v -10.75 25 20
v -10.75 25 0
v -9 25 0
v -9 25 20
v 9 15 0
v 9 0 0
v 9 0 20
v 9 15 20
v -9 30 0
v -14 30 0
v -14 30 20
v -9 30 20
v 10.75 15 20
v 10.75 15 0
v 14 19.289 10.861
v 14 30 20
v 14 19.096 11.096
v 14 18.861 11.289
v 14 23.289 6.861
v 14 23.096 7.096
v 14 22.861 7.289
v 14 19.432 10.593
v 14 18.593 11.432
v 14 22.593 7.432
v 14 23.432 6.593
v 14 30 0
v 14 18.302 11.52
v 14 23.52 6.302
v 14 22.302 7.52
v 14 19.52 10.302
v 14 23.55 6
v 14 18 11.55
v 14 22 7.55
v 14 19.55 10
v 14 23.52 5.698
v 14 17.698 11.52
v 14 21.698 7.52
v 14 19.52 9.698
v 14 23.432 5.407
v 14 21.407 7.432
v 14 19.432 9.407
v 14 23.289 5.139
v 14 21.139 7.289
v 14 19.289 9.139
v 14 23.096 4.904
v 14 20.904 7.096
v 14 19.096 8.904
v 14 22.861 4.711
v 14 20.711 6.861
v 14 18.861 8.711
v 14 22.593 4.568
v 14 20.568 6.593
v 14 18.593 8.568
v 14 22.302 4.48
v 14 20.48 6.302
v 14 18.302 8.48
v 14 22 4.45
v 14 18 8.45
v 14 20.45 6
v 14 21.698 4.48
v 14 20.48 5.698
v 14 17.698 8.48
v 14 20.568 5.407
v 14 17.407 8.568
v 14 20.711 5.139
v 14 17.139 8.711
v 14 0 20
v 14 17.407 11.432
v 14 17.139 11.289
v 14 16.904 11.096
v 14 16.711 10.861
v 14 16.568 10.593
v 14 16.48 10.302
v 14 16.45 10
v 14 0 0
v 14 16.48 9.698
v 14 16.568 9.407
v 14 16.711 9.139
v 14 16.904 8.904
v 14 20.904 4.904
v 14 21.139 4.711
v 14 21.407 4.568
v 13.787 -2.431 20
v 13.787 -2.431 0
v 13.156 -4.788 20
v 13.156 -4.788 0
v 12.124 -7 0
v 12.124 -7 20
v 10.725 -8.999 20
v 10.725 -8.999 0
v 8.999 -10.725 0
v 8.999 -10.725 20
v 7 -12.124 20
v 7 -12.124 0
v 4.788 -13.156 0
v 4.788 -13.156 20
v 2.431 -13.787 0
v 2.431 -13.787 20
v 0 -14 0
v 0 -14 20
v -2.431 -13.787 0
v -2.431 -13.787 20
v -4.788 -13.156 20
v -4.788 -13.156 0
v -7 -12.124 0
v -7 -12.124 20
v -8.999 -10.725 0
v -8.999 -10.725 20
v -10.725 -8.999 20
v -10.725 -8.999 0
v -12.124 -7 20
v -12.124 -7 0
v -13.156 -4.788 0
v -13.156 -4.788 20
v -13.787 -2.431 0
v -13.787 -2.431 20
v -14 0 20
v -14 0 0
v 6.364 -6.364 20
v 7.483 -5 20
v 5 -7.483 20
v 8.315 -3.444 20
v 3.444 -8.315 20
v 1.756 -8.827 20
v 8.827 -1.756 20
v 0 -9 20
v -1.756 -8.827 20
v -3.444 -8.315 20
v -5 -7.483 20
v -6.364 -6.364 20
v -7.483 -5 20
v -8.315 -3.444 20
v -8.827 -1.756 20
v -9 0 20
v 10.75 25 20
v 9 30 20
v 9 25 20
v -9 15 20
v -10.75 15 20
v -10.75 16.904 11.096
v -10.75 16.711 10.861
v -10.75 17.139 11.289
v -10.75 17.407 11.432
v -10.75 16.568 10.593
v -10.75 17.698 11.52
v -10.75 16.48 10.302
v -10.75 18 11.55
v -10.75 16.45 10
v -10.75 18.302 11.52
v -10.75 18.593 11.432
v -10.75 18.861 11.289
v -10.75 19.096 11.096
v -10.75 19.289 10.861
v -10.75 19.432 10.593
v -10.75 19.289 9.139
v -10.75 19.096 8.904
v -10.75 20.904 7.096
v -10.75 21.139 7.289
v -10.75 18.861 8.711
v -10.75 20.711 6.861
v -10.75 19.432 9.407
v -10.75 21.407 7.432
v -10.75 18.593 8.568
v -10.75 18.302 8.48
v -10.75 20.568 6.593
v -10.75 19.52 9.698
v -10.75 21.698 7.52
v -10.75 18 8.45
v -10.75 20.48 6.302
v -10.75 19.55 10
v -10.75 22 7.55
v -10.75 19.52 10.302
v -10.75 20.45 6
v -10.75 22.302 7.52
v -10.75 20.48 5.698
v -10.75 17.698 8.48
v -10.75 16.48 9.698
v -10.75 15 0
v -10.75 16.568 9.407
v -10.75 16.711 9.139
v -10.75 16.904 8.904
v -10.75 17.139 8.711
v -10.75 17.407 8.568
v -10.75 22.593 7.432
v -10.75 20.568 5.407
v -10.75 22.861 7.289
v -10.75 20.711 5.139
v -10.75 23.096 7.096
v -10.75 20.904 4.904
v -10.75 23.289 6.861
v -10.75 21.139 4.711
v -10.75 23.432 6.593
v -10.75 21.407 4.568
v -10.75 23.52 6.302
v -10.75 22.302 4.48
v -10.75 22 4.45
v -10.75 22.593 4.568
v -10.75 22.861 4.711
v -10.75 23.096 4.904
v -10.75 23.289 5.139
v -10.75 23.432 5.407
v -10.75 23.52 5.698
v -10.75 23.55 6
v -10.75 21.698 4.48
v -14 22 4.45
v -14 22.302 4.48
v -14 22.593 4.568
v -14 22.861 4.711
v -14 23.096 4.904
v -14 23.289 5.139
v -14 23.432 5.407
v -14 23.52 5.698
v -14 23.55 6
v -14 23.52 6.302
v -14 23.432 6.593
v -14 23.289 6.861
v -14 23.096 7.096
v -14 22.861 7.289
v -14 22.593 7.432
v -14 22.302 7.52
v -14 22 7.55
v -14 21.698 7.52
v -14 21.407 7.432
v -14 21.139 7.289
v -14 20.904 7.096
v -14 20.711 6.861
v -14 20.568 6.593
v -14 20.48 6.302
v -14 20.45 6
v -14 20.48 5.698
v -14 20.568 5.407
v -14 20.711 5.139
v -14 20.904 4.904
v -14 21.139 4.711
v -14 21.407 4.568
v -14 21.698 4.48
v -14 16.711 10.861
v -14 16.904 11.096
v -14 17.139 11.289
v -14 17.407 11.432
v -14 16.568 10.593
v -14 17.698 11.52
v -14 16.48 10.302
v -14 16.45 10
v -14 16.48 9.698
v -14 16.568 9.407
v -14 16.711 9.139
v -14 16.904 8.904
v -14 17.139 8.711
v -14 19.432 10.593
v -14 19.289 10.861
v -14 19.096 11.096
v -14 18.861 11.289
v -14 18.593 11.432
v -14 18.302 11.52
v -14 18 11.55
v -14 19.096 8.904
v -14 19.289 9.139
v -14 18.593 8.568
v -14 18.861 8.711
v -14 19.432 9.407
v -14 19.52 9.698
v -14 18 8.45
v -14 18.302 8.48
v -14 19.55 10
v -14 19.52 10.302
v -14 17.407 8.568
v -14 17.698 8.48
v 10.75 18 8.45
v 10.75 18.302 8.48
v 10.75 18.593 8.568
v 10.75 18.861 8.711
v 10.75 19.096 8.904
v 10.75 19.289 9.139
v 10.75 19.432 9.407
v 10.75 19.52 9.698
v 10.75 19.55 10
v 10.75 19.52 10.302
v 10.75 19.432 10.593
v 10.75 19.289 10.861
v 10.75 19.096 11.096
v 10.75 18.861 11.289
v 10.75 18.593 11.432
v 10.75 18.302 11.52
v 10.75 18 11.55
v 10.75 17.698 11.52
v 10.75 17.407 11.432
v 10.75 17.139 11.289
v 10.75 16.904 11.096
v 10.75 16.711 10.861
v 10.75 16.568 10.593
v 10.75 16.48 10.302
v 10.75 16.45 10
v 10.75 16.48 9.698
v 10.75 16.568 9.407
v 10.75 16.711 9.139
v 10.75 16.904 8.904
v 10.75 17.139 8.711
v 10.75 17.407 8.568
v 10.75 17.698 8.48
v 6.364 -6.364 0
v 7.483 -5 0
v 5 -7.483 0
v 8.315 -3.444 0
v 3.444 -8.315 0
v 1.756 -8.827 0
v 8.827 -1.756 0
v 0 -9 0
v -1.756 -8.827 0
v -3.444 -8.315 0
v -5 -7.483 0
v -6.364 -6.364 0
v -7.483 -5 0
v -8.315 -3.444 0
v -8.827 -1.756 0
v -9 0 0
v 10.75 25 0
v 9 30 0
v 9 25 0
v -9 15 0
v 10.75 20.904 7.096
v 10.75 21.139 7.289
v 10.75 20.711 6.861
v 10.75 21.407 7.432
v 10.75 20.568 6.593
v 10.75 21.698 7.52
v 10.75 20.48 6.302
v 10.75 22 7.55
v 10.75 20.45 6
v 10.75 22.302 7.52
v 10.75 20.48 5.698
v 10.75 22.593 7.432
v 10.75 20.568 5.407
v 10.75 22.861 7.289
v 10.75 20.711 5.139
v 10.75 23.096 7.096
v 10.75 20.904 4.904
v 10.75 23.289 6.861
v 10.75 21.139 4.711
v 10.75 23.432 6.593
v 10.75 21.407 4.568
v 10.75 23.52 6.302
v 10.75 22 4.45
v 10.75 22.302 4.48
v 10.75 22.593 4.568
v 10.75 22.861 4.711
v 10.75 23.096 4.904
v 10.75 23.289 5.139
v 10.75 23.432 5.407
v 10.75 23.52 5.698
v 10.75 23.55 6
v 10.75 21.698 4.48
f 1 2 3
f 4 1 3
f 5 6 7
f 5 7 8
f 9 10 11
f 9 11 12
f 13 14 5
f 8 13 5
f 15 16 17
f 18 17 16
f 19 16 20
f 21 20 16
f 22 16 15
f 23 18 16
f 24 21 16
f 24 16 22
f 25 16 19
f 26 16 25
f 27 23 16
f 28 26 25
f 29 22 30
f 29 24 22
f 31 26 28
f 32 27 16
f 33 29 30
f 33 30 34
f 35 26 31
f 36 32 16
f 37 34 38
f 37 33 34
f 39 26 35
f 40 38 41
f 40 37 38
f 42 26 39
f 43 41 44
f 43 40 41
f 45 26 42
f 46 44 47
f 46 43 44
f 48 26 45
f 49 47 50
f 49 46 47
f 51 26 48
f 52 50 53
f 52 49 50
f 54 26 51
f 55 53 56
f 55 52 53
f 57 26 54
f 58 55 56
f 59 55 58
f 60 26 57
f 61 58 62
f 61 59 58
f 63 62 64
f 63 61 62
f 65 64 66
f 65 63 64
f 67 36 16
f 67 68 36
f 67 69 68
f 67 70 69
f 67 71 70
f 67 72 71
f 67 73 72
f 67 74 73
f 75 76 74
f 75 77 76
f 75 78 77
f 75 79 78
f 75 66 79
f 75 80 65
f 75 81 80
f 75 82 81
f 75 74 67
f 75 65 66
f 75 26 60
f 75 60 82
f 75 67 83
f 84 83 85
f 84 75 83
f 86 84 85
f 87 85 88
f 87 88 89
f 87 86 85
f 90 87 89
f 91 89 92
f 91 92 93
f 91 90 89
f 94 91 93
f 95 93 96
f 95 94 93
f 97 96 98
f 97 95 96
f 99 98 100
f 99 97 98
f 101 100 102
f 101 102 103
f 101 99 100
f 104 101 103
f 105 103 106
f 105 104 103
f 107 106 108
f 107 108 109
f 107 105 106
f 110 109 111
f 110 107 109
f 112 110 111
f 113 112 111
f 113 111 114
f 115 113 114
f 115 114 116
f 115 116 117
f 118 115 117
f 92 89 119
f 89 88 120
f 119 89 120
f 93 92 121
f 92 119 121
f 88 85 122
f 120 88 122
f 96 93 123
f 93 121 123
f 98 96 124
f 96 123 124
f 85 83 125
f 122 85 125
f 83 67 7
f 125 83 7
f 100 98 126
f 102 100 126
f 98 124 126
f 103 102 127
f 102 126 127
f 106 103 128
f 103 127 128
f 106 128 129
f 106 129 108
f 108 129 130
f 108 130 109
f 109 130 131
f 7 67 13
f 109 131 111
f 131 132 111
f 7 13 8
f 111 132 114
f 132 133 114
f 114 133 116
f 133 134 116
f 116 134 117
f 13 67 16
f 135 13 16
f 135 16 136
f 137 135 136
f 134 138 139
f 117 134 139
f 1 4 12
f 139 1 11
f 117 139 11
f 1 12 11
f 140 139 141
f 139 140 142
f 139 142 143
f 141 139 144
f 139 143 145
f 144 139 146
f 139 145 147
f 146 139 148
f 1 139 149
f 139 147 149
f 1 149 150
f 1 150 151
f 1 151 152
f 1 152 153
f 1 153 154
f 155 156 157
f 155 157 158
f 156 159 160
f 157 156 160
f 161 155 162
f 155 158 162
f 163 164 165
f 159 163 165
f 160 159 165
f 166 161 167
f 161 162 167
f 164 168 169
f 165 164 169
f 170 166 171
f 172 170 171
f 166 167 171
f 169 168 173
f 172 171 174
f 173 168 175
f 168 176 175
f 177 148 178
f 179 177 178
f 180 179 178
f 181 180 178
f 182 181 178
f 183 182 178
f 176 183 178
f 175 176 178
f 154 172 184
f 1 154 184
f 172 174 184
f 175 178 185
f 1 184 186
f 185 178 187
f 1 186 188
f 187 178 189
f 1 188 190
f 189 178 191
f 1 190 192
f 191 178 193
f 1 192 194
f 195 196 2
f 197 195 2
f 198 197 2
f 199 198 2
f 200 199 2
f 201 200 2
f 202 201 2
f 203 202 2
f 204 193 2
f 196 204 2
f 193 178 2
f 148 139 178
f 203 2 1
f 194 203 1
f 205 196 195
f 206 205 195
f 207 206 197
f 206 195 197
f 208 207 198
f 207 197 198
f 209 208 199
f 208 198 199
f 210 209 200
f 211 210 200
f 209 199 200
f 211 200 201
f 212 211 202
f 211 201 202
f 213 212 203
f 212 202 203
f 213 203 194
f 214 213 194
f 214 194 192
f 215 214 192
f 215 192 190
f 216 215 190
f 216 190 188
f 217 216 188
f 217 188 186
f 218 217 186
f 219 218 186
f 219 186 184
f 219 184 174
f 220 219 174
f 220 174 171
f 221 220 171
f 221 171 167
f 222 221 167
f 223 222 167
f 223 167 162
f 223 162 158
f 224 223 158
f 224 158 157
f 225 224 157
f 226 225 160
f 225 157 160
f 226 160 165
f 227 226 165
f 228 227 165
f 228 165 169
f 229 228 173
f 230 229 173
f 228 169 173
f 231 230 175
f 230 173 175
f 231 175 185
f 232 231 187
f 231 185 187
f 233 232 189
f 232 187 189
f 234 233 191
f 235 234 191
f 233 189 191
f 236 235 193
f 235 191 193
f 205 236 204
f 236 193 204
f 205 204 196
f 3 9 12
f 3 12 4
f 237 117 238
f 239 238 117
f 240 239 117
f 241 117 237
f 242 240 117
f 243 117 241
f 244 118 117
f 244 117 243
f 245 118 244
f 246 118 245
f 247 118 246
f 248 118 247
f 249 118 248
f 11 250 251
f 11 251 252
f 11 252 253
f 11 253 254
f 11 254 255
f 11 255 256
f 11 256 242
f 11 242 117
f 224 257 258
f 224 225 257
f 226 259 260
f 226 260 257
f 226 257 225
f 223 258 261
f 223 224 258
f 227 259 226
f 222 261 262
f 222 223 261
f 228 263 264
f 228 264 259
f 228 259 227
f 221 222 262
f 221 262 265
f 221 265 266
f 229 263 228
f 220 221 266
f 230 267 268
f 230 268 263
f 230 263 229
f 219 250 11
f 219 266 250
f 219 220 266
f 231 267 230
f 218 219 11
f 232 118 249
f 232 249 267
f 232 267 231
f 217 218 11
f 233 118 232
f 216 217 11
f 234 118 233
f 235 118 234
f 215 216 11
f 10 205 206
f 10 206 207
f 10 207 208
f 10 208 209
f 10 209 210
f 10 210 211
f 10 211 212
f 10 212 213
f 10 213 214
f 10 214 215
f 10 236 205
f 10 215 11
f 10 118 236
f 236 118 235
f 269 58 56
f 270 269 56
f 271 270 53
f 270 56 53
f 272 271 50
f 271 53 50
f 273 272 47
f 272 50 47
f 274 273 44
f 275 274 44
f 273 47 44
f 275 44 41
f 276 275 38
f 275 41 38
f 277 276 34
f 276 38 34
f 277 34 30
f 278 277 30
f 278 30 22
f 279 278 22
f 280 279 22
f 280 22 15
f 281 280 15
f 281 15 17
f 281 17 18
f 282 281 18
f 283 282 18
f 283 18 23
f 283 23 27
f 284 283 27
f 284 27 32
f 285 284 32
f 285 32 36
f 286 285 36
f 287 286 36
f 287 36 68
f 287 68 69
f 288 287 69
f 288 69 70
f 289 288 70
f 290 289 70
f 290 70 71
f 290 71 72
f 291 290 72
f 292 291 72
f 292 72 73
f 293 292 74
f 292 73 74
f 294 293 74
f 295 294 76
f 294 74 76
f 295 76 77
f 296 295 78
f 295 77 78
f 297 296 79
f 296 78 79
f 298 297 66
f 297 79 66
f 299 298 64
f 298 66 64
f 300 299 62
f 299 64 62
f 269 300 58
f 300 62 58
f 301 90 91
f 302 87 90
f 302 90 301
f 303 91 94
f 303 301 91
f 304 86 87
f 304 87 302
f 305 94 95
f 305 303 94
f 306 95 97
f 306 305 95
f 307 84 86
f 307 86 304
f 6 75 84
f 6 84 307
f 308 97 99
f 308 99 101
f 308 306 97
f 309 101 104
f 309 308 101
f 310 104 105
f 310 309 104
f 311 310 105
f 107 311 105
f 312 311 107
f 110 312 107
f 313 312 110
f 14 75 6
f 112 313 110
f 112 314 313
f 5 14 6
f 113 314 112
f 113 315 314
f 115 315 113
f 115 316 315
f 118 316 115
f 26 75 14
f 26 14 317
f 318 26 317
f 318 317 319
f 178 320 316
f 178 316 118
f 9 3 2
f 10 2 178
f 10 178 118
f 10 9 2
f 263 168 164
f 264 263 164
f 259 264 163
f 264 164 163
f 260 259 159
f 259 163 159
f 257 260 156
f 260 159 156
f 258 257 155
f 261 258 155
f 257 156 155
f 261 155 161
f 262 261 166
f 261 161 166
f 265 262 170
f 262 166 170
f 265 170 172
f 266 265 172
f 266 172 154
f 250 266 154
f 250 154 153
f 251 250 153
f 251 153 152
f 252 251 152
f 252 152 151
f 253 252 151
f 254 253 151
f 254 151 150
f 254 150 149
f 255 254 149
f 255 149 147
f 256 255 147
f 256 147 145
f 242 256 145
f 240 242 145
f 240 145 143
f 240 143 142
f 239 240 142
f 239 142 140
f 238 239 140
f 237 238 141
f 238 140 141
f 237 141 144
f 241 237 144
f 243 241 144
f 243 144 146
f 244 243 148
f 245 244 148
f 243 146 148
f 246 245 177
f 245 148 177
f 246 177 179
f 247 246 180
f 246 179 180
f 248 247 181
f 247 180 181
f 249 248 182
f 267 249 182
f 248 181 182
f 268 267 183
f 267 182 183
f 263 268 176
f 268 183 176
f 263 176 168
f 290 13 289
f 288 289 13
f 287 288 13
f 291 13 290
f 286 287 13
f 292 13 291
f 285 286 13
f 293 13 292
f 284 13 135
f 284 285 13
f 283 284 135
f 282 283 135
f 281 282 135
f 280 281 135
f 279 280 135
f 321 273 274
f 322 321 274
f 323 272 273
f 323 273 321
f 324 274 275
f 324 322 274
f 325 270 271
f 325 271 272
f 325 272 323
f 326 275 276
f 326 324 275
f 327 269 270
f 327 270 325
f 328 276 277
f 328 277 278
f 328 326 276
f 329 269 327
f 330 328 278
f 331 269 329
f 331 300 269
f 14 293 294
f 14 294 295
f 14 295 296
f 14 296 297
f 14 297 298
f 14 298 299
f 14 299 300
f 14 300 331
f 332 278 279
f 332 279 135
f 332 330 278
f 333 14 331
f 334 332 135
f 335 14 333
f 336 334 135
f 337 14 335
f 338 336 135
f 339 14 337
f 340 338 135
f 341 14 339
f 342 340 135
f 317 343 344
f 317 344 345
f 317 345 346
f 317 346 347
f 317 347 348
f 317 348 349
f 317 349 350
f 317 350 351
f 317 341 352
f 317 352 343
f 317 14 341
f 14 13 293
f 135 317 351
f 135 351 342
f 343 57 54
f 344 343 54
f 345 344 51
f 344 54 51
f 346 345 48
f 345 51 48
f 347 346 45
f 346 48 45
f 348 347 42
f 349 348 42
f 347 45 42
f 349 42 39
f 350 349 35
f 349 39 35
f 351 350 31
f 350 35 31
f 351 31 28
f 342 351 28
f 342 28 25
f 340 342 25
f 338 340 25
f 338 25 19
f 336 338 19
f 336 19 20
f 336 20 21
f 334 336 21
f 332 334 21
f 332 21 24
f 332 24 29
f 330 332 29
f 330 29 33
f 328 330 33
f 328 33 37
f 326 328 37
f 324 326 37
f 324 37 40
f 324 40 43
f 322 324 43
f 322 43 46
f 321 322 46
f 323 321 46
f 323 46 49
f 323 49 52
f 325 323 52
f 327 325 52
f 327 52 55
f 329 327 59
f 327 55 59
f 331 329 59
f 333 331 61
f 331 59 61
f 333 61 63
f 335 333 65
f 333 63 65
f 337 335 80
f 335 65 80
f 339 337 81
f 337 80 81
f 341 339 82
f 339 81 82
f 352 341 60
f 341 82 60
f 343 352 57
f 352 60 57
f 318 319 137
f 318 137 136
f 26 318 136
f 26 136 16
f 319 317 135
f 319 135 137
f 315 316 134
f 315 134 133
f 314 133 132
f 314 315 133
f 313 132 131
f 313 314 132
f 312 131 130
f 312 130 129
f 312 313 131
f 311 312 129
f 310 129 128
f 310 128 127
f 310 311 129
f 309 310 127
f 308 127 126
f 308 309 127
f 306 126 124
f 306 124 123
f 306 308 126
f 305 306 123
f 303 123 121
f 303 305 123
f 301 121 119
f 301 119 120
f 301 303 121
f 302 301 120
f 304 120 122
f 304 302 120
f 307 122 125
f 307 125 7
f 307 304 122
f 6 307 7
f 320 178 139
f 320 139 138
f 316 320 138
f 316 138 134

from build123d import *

# Parameters (mm, degrees)
EXTRUDE_1_DEPTH     = 20
SKETCH_2_R          = 1.55
CUT_EXTRUDE_1_DEPTH = 30
SKETCH_3_W          = 1.75
SKETCH_3_H          = 10
CUT_EXTRUDE_2_DEPTH = 20


with BuildPart() as part:
    # 草图1 → 凸台-拉伸1 (new body)
    with BuildSketch(Plane.XY):
        with BuildLine():
            Line((-14, 0), (-14, 30))
            Line((-14, 30), (-9, 30))
            Line((-9, 30), (-9, 0))
            ThreePointArc((-9, 0), (0, -9), (9, 0))
            Line((9, 0), (9, 30))
            Line((9, 30), (14, 30))
            Line((14, 30), (14, 0))
            ThreePointArc((14, 0), (0, -14), (-14, 0))
        make_face()
    extrude(amount=EXTRUDE_1_DEPTH)

    # 草图2 → 切除-拉伸1 (cut)
    with BuildSketch(Plane(origin=(14, 0, 0), x_dir=(0, 0, -1), z_dir=(1, 0, 0))):
        with Locations((-10, 18)):
            Circle(SKETCH_2_R)
        with Locations((-6, 22)):
            Circle(SKETCH_2_R)
    extrude(amount=-CUT_EXTRUDE_1_DEPTH, mode=Mode.SUBTRACT)

    # 草图3 → 切除-拉伸2 (cut)
    with BuildSketch(Plane(origin=(0, 0, 0), x_dir=(-1, 0, 0), z_dir=(0, 0, -1))):
        with Locations((-9.875, 20)):
            Rectangle(SKETCH_3_W, SKETCH_3_H)
    cut_extrude_2 = extrude(amount=-CUT_EXTRUDE_2_DEPTH, mode=Mode.SUBTRACT)

    # 镜向1: 切除-拉伸2 across plane
    add(cut_extrude_2.mirror(Plane(origin=(0, 0, 0), x_dir=(0, 0, 1), z_dir=(1, 0, 0))), mode=Mode.SUBTRACT)


solid = part.part
